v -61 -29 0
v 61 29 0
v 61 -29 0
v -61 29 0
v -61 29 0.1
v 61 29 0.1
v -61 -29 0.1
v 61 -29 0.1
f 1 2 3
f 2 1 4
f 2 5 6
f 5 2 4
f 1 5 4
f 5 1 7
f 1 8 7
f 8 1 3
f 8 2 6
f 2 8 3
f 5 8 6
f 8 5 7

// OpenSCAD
// file: ../p/box5-12.scad
use <../lib.scad>
function ldraw_lib__box5_12() = [
// 0 Box with 5 Faces without Any Edges
// 0 Name: box5-12.dat
// 0 Author: Chris Dee [cwdee]
// 0 !LDRAW_ORG Primitive UPDATE 2009-02
// 0 !LICENSE Licensed under CC BY 4.0 : see CAreadme.txt
// 
// 0 BFC CERTIFY CCW
  [0,"BFC","CERTIFY"],
  [0,"BFC","CCW"],
// 
// 0 !HISTORY 2009-09-03 [PTadmin] Official Update 2009-02
// 
// 
// 4 16 1 1 1 1 1 -1 -1 1 -1 -1 1 1
  [4,16,1,1,1,1,1,-1,-1,1,-1,-1,1,1],
// 4 16 -1 0 1 1 0 1 1 1 1 -1 1 1
  [4,16,-1,0,1,1,0,1,1,1,1,-1,1,1],
// 4 16 -1 0 -1 -1 0 1 -1 1 1 -1 1 -1
  [4,16,-1,0,-1,-1,0,1,-1,1,1,-1,1,-1],
// 4 16 1 0 -1 -1 0 -1 -1 1 -1 1 1 -1
  [4,16,1,0,-1,-1,0,-1,-1,1,-1,1,1,-1],
// 4 16 1 0 1 1 0 -1 1 1 -1 1 1 1
  [4,16,1,0,1,1,0,-1,1,1,-1,1,1,1],
// 0
];
module ldraw_lib__box5_12(step=0, col=false, unit=2/5, alt=false, line=0.2, solid=!$preview)
    makepoly(ldraw_lib__box5_12(), step=step, col=col, unit=unit, alt=alt, line=line, solid=solid);
ldraw_lib__box5_12(line=0.2);
// main file
use <../lib.scad>
use <../p/box5-12.scad>
function ldraw_lib__4568123f() = [
// 0 Sticker  7.2 x 15.2 with SW Lambda-Class T-4a Shuttle Specifications
// 0 Name: 4568123f.dat
// 0 Author: Evert-Jan Boer [ejboer]
// 0 !LDRAW_ORG Part UPDATE 2024-04
// 0 !LICENSE Licensed under CC BY 4.0 : see CAreadme.txt
// 
// 0 BFC CERTIFY CCW
  [0,"BFC","CERTIFY"],
  [0,"BFC","CCW"],
// 
// 0 !KEYWORDS Imperial Shuttle, Set 10212, Star Wars
// 
// 0 !HISTORY 2024-05-28 [OrionP] Official Update 2024-04
// 
// 
// 1 16 0 -0.25 0 152.5 0 0 0 0.25 0 0 0 72.5 box5-12.dat
  [1,16,0,-0.25,0,152.5,0,0,0,0.25,0,0,0,72.5, ldraw_lib__box5_12()],
// 
// 0 !TEXMAP START PLANAR -152.5 -0.25 72.5 152.5 -0.25 72.5 -152.5 -0.25 -72.5 4568123f.png
// 0 !: 4 0 152.5 -0.25 72.5 -152.5 -0.25 72.5 -152.5 -0.25 -72.5 152.5 -0.25 -72.5
// 0 !TEXMAP FALLBACK
// 0 // Needs Work: fallback pattern
// 4 0 152.5 -0.25 72.5 -152.5 -0.25 72.5 -152.5 -0.25 -72.5 152.5 -0.25 -72.5
  [4,0,152.5,-0.25,72.5,-152.5,-0.25,72.5,-152.5,-0.25,-72.5,152.5,-0.25,-72.5],
// 0 !TEXMAP END
];
module ldraw_lib__4568123f(step=0, col=false, unit=2/5, alt=false, line=0.2, solid=!$preview)
    makepoly(ldraw_lib__4568123f(), step=step, col=col, unit=unit, alt=alt, line=line, solid=solid);
ldraw_lib__4568123f(line=0.2);
